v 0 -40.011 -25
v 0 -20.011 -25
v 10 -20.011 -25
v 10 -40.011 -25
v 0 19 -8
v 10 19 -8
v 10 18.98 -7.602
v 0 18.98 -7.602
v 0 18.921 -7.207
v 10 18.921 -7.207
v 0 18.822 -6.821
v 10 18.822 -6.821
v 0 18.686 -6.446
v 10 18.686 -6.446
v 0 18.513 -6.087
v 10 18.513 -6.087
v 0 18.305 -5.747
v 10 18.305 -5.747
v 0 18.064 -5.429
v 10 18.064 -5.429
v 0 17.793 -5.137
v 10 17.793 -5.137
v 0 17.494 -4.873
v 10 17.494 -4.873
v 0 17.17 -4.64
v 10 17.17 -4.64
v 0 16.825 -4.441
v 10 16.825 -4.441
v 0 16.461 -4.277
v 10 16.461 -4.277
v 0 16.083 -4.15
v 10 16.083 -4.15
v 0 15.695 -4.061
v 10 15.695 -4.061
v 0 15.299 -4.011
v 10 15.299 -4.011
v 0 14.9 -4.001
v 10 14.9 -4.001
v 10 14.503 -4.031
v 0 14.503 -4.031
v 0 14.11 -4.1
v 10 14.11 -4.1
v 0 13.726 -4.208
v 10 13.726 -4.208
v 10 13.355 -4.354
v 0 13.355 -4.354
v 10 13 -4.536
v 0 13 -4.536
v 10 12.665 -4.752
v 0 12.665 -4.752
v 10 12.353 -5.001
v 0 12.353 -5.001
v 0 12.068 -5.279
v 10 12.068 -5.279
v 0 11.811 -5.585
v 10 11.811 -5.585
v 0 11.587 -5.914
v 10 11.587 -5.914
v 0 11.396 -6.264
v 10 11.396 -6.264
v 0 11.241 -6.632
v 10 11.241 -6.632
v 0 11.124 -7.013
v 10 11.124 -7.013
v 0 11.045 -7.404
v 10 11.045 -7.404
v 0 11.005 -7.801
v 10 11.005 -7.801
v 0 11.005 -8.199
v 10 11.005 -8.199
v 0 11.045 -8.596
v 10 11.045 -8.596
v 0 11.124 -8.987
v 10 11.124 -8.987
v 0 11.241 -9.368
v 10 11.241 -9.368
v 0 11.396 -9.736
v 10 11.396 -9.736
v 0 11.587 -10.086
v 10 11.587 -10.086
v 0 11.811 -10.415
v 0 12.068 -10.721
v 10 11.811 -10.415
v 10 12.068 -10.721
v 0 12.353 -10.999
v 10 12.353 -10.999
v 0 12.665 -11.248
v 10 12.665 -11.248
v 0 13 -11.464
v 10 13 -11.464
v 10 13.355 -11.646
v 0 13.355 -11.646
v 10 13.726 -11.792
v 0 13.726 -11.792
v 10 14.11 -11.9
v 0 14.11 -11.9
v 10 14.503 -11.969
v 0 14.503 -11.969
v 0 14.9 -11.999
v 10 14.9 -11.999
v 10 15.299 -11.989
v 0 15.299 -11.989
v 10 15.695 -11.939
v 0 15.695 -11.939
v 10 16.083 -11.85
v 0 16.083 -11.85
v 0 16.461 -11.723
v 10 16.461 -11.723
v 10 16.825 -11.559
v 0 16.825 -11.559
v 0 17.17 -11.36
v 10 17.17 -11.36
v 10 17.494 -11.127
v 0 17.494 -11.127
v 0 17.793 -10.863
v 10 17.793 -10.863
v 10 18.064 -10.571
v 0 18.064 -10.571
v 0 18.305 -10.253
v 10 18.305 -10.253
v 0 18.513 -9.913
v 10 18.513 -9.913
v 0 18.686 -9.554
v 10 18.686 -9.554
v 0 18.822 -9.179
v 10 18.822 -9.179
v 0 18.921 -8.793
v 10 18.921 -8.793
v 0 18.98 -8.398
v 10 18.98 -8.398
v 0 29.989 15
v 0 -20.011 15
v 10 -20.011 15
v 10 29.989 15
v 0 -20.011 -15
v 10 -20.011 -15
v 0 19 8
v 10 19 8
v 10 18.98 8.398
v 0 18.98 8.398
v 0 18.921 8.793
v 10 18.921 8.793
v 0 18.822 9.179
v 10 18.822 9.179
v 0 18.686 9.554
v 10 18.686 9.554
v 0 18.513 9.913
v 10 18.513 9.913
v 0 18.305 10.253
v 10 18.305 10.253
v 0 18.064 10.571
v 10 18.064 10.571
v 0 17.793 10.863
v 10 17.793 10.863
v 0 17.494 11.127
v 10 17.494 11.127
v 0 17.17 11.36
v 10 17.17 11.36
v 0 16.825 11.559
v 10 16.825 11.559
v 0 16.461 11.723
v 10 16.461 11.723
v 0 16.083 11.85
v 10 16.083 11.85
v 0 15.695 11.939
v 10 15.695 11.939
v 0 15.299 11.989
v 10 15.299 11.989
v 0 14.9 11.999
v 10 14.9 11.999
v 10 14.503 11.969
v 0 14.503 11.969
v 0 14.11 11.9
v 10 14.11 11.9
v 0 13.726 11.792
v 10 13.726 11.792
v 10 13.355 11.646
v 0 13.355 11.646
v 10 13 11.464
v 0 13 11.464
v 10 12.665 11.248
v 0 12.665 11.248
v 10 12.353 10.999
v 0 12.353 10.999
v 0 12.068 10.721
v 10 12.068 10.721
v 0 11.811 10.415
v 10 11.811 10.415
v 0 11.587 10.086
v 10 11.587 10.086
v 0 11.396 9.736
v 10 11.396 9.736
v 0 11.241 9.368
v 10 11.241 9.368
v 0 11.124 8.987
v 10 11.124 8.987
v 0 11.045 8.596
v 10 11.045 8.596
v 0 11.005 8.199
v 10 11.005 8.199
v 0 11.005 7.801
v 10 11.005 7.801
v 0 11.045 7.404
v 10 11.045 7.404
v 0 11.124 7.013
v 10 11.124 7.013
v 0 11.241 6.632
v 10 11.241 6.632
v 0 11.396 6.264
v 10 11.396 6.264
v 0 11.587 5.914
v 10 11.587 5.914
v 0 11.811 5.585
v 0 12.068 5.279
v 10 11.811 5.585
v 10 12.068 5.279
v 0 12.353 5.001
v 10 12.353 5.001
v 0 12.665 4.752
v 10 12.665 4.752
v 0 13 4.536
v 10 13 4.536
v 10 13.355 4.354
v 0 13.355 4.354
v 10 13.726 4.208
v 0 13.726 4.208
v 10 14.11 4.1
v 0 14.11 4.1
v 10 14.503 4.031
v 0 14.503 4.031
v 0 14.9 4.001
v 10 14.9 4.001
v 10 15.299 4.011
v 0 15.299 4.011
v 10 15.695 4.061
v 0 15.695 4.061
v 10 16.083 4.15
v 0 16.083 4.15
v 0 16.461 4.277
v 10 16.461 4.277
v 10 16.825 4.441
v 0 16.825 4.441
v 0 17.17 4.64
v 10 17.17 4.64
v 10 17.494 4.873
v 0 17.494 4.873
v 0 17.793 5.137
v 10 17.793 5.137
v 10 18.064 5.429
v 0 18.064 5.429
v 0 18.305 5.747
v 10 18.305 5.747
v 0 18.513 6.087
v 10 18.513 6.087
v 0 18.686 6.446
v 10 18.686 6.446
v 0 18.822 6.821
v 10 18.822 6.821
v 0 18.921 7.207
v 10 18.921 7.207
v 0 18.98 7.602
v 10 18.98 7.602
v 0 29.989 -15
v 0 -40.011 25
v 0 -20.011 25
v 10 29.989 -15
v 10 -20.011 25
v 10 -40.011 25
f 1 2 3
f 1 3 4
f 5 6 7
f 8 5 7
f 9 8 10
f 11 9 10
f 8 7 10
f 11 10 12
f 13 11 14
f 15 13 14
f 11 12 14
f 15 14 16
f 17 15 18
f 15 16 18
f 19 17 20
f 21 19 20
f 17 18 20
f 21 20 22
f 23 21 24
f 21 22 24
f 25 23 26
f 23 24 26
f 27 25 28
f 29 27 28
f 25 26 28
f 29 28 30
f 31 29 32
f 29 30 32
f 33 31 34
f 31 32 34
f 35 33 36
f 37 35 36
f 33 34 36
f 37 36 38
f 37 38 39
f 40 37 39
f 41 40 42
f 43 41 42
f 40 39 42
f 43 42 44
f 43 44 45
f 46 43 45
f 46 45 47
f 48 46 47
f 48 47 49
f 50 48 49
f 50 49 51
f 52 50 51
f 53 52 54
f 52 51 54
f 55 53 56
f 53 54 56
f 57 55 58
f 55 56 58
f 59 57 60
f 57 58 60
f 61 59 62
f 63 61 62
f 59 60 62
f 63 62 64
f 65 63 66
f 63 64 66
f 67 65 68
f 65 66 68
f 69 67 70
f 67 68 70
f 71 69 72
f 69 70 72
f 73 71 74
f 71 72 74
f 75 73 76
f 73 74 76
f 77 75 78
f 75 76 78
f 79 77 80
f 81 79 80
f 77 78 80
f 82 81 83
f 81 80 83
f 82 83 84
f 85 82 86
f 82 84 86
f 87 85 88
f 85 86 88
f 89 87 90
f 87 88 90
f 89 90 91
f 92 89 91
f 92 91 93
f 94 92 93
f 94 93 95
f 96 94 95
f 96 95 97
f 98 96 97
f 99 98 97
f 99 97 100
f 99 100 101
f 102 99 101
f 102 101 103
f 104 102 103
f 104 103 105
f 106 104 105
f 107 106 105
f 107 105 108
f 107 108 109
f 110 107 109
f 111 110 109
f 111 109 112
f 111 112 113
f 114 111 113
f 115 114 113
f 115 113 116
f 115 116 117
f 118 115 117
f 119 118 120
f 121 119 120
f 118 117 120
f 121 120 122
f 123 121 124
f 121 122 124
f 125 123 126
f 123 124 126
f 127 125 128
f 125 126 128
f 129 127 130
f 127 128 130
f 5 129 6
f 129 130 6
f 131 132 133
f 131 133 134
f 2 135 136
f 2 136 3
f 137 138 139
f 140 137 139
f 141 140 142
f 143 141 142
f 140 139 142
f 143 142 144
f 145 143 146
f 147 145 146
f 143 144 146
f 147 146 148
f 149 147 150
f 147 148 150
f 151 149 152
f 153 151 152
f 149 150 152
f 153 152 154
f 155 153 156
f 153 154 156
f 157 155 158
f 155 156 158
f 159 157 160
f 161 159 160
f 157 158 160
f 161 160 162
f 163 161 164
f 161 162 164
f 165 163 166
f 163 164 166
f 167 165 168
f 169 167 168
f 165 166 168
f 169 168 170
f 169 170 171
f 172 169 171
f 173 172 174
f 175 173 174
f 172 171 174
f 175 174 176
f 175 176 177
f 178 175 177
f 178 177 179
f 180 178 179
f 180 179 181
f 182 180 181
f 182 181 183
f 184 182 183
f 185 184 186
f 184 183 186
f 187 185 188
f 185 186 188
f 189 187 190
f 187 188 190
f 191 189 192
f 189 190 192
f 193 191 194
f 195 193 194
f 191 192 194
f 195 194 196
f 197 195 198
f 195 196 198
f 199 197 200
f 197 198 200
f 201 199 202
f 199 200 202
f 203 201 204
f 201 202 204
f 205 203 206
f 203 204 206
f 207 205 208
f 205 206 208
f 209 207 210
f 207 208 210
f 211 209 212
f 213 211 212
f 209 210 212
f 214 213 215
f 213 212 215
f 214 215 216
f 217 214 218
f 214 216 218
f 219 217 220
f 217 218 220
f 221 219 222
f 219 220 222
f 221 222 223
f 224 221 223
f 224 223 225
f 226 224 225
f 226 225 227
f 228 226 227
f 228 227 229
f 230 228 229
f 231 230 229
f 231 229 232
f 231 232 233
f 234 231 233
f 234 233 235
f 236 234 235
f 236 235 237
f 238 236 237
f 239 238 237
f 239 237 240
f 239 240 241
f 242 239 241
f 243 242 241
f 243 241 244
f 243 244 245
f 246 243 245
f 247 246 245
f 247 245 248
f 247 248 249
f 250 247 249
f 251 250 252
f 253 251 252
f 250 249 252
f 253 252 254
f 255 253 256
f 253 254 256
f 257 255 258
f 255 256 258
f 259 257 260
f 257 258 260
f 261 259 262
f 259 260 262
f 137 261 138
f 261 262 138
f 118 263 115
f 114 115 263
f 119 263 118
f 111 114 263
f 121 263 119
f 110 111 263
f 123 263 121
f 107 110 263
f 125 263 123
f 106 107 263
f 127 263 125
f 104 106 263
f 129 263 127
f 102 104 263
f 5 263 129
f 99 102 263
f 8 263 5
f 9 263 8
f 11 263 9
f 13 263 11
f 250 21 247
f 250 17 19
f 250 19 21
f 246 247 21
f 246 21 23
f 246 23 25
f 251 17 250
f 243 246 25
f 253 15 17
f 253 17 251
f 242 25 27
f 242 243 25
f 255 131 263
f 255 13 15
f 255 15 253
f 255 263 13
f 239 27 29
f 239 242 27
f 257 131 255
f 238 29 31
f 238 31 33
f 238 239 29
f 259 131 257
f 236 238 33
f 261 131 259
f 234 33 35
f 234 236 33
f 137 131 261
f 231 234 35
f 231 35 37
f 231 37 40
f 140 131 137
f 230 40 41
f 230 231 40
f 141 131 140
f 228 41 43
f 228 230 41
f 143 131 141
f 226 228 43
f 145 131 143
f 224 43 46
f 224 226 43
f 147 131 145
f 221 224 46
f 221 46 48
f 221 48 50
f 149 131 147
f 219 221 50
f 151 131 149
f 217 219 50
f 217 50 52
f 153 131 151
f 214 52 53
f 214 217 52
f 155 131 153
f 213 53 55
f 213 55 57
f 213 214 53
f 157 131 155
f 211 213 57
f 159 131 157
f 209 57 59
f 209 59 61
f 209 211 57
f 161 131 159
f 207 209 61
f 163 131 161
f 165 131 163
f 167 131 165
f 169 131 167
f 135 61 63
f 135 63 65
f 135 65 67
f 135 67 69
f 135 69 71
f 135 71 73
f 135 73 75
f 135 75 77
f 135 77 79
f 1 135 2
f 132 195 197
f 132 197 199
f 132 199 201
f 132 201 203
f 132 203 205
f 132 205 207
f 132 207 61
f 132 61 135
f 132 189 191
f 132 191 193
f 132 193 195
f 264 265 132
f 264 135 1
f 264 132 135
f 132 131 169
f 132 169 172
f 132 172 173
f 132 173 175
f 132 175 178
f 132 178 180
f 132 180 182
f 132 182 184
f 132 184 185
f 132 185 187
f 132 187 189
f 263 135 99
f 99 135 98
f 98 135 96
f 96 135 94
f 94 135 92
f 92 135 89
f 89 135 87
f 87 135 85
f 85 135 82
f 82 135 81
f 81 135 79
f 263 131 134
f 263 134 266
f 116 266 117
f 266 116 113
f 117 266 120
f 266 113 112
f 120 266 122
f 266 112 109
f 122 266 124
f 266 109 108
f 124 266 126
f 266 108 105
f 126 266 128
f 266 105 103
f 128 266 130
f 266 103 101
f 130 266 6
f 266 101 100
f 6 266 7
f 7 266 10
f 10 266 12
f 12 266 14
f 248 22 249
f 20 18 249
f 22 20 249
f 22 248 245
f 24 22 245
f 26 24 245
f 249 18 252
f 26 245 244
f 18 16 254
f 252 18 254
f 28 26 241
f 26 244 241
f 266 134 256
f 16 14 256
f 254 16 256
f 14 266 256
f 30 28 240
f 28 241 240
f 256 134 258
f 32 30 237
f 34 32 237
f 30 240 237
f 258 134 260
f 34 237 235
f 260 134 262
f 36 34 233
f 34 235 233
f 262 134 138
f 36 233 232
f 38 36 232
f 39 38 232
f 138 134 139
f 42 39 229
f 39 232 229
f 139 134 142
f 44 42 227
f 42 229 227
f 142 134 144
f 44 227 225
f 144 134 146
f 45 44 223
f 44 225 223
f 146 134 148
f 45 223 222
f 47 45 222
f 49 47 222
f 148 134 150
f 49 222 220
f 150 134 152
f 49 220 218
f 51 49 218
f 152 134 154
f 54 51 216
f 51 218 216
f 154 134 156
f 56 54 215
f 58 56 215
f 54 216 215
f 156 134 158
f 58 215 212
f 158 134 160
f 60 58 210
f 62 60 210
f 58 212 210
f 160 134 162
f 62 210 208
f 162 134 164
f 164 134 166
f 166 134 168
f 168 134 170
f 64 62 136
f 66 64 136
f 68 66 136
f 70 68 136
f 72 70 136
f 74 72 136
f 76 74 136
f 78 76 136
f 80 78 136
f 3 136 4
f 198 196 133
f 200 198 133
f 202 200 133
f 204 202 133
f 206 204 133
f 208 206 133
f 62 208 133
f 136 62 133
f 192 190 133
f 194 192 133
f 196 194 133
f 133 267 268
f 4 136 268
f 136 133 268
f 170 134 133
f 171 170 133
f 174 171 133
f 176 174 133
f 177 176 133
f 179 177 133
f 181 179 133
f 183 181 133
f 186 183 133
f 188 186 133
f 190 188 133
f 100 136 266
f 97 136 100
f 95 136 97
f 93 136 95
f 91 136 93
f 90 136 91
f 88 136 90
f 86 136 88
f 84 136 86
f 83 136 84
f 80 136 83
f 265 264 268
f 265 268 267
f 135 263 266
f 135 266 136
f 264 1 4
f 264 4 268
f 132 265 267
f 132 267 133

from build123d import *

# Parameters (mm, degrees)
PAD_DEPTH    = 10
SKETCH001_R  = 4
POCKET_DEPTH = 10


with BuildPart() as part:
    # Sketch → Pad (new body)
    with BuildSketch(Plane.YZ):
        Polygon((-40.011498, 25), (-20.011498, 25), (-20.011498, 15), (29.988502, 15), (29.988502, -15), (-20.011498, -15), (-20.011498, -25), (-40.011498, -25), align=None)
    extrude(amount=PAD_DEPTH)

    # Sketch001 → Pocket (cut)
    with BuildSketch(Plane.YZ.offset(10)):
        with Locations((15, 8)):
            Circle(SKETCH001_R)
        with Locations((15, -8)):
            Circle(SKETCH001_R)
    extrude(amount=-POCKET_DEPTH, mode=Mode.SUBTRACT)


solid = part.part
